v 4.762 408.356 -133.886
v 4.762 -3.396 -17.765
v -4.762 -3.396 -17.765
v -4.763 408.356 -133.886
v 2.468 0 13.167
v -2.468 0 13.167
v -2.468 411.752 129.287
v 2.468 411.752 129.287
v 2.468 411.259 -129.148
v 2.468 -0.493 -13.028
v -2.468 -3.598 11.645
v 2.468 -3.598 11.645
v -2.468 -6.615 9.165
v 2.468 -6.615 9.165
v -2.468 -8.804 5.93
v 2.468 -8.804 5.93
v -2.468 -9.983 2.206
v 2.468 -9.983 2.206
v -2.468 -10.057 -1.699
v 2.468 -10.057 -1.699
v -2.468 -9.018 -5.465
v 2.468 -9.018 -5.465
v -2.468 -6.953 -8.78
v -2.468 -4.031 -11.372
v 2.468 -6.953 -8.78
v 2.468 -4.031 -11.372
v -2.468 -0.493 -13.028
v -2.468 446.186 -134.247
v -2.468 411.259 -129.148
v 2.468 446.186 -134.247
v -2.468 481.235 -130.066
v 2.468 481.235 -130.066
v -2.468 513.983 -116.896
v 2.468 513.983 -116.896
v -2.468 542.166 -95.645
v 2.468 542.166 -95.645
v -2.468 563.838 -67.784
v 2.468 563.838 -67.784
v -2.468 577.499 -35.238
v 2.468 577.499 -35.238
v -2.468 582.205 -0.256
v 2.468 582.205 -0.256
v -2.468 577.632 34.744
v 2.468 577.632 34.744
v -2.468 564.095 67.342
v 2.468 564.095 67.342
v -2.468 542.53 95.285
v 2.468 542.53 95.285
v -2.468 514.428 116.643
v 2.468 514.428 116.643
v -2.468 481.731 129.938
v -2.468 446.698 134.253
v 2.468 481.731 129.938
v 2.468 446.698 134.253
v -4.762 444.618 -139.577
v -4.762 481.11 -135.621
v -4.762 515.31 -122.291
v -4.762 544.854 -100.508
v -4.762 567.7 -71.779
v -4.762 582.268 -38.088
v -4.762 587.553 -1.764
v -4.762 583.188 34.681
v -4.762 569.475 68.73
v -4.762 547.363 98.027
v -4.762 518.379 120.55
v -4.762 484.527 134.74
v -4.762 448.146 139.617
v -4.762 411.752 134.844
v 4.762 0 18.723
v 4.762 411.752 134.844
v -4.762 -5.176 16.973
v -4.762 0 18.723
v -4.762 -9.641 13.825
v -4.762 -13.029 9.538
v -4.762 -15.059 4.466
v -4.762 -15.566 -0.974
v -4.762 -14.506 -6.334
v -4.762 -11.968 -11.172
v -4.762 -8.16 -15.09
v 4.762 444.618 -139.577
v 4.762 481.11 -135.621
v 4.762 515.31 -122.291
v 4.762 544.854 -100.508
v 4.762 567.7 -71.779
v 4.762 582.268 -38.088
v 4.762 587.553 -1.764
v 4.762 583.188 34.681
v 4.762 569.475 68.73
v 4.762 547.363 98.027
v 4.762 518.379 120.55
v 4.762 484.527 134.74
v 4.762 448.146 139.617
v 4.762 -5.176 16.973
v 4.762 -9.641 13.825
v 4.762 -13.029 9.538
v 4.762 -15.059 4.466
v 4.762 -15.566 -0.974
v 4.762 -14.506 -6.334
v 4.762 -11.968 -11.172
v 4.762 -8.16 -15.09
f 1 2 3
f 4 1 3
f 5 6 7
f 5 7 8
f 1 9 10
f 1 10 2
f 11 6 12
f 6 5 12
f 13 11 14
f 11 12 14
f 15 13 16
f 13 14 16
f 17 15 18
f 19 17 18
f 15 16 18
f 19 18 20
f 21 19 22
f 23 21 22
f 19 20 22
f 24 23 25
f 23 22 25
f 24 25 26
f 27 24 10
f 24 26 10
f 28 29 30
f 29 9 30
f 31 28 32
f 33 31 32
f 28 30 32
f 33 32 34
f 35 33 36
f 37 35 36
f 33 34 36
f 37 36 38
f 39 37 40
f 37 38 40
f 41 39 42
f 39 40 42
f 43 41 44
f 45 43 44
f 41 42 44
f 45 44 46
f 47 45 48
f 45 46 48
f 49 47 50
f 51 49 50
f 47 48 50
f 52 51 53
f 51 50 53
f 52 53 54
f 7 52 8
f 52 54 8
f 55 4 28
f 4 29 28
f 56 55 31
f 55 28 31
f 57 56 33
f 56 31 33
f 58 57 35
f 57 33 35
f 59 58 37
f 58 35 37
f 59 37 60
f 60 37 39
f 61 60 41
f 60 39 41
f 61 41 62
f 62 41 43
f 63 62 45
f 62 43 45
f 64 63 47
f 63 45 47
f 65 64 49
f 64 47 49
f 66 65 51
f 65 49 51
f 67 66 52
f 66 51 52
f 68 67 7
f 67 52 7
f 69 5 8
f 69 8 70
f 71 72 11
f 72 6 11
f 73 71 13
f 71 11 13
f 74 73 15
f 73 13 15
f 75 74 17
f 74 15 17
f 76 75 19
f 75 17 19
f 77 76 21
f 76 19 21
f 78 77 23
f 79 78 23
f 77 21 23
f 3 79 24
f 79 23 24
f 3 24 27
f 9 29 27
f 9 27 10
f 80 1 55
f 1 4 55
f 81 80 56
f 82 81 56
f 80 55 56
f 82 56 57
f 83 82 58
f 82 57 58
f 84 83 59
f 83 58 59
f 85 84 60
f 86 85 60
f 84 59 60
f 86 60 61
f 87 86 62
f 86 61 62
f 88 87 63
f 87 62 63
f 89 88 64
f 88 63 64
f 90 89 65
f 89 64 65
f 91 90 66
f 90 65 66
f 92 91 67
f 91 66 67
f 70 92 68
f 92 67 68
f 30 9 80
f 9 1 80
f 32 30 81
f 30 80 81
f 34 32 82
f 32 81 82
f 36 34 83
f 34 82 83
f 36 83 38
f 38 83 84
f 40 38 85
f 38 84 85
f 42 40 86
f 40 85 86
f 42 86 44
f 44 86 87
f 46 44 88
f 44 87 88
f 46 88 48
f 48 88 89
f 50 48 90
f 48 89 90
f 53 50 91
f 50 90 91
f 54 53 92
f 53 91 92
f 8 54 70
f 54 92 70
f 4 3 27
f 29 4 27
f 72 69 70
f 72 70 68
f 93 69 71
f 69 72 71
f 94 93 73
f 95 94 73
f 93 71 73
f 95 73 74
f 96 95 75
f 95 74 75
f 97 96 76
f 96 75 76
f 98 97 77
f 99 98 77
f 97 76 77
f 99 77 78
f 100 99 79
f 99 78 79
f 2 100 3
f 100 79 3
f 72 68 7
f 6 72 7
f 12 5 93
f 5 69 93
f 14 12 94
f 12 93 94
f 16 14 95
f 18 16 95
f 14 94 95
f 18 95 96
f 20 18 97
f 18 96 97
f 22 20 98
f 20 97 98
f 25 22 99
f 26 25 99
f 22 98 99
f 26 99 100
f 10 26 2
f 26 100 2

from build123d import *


with BuildPart() as f2:
    # F2: sweep along a path in F0
    with BuildLine(Plane.YZ) as f2_path:
        ThreePointArc((411.7521428571, -128.3438525018), (581.2971428571, 0), (411.7521428571, 128.3438525018))
        Line((411.7521428571, 128.3438525018), (0, 12.2232240478))
        ThreePointArc((0, 12.2232240478), (-9.2528571429, 0), (0, -12.2232240478))
        Line((0, -12.2232240478), (411.7521428571, -128.3438525018))
    # F1 (on Front) → F2 (sweep)
    with BuildSketch(Plane.XZ):
        Polygon((-4.7625, 18.7229695863), (-2.468474675, 13.1667195863), (2.468474675, 13.1667195863), (4.7625, 18.7229695863), align=None)
    sweep(path=f2_path.line)


solid = f2.part
